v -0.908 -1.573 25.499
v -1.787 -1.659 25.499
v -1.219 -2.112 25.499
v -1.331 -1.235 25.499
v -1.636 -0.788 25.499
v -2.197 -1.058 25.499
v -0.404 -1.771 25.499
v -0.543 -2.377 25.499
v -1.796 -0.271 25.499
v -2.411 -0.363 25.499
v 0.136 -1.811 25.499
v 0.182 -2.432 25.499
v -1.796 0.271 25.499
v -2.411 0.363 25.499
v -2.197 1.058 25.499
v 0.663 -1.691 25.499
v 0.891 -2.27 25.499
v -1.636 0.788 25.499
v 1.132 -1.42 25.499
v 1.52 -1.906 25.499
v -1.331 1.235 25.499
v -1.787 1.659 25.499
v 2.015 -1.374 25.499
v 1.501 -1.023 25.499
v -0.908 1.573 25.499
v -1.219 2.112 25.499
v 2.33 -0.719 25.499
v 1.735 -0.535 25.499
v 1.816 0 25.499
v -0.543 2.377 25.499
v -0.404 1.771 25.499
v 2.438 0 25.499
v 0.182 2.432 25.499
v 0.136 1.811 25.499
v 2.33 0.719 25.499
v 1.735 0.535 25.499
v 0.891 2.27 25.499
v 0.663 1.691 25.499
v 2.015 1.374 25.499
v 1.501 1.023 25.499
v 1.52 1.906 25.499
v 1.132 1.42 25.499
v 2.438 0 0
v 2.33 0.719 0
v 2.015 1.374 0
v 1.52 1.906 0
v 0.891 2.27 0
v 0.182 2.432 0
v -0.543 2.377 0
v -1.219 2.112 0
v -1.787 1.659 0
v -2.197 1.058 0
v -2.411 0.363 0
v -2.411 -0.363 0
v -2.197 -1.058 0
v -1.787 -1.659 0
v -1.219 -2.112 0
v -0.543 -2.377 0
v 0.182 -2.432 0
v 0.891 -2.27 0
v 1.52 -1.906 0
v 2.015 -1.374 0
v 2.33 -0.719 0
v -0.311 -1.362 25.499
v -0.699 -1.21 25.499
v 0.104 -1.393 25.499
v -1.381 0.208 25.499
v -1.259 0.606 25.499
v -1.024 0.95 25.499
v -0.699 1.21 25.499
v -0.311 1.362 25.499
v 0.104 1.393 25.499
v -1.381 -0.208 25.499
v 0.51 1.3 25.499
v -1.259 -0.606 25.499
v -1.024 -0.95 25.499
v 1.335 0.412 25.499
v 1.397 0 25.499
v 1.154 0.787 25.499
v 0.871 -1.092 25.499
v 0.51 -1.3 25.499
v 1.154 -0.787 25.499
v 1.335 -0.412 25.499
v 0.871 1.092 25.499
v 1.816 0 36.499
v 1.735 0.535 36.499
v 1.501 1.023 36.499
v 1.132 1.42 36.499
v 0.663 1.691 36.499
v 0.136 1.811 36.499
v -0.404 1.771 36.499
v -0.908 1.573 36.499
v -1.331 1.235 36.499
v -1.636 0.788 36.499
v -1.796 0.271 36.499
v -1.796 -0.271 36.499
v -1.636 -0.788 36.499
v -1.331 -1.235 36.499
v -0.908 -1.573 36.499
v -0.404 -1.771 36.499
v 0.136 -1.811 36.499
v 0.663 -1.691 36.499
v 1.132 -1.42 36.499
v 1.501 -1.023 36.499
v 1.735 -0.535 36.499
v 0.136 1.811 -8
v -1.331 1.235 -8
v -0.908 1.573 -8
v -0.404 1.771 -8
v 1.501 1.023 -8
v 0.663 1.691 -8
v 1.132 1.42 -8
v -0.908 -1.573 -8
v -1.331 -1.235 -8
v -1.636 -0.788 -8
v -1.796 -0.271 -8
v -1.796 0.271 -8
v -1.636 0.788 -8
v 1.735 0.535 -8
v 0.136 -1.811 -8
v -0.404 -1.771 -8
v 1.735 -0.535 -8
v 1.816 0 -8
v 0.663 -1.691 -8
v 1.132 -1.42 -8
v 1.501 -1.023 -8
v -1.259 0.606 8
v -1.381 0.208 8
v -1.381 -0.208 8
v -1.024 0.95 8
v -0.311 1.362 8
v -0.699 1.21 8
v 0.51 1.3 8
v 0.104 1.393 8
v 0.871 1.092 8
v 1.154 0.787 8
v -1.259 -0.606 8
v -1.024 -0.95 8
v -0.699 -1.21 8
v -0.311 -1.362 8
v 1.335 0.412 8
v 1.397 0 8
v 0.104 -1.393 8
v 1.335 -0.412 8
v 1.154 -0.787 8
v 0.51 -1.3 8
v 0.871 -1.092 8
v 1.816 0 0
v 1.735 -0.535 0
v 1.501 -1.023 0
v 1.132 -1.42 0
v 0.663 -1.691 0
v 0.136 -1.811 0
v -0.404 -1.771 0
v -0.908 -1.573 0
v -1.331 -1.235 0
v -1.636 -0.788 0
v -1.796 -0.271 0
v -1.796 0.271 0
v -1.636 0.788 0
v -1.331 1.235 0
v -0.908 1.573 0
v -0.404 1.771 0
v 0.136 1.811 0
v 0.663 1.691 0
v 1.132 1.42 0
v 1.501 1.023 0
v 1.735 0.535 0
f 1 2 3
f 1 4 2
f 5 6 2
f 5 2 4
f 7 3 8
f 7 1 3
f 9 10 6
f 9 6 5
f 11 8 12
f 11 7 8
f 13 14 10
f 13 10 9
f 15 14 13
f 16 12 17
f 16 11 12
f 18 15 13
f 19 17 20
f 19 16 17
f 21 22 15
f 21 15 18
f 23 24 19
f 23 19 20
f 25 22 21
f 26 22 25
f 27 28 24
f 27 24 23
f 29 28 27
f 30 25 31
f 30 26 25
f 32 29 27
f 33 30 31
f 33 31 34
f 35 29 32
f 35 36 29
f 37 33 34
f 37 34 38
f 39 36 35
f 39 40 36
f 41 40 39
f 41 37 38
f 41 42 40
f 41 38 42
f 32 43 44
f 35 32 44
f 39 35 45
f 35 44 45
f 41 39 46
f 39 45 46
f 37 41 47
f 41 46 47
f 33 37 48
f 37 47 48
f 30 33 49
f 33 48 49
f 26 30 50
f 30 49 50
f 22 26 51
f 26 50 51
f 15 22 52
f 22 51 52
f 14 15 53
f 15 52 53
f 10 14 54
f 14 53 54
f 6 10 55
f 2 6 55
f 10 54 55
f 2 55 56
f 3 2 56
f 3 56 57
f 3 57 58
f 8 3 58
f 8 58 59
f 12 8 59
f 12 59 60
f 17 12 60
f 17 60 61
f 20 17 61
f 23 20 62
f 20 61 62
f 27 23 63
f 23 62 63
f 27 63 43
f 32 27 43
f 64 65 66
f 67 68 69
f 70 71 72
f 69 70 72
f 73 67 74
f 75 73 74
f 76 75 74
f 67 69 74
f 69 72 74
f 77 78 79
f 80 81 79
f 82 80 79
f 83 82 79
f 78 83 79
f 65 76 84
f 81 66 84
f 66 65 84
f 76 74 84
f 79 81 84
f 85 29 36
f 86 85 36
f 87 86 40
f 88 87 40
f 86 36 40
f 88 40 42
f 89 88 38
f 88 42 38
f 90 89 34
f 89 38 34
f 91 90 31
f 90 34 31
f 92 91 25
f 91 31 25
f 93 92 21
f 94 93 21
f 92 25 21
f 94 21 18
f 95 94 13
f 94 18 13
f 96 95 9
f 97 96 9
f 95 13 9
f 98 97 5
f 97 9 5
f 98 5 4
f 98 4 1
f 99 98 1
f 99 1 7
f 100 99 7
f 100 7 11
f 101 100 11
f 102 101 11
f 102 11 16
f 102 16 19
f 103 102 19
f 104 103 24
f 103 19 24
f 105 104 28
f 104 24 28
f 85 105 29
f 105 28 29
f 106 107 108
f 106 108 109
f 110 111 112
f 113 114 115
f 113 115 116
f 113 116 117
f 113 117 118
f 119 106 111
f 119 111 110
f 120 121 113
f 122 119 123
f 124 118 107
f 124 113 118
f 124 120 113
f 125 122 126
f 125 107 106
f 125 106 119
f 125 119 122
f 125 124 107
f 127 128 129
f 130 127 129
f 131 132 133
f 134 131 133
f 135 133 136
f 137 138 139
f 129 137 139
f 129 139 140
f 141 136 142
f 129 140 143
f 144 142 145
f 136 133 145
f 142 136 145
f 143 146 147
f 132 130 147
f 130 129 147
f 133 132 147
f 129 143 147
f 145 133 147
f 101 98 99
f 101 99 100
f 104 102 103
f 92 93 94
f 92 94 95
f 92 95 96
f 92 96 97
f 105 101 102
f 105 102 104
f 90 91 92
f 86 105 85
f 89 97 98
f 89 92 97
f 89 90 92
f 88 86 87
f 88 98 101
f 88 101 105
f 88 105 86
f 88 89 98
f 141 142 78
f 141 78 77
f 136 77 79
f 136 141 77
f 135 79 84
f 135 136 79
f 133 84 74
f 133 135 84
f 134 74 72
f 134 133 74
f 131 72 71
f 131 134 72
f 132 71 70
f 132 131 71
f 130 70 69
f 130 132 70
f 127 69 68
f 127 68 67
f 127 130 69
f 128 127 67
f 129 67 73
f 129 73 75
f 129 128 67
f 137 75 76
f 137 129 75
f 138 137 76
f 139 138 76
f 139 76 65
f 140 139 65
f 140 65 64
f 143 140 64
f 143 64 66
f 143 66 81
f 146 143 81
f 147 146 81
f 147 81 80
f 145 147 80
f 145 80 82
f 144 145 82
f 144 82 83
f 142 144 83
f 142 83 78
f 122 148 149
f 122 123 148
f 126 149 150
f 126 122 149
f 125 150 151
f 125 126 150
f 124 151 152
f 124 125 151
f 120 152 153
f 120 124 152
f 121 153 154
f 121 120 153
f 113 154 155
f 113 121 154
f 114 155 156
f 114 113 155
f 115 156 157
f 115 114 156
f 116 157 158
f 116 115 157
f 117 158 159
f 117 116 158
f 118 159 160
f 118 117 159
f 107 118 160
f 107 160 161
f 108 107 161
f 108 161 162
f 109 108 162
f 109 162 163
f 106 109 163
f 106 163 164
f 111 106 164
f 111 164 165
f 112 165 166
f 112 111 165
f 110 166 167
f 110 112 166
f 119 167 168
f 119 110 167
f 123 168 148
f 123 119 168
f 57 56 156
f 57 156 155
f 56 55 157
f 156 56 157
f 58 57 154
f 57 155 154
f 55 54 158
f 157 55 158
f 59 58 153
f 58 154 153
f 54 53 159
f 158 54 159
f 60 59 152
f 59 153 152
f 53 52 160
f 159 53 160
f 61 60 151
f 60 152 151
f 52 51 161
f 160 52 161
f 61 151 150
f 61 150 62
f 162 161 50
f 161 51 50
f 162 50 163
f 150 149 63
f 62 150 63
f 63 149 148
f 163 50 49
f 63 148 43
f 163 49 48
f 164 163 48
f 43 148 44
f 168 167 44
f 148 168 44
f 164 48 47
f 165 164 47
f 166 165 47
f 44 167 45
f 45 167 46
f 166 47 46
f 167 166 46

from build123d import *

# Parameters (mm, degrees)
SKETCH1_R               = 2.4384
SKETCH1_R_2             = 1.397
BOSS_EXTRUDE1_DEPTH     = 25.49906
CROQUIS1_R              = 1.8161
SALIENTE_EXTRUIR1_DEPTH = 11
CROQUIS2_R              = 1.8161
SALIENTE_EXTRUIR2_DEPTH = 8


with BuildPart() as part:
    # Sketch1 → Boss-Extrude1 (new body)
    with BuildSketch(Plane.XY):
        Circle(SKETCH1_R)
        Circle(SKETCH1_R_2, mode=Mode.SUBTRACT)
    extrude(amount=BOSS_EXTRUDE1_DEPTH)

    # Croquis1 → Saliente-Extruir1 (add)
    with BuildSketch(Plane.XY.offset(25.49906)):
        Circle(CROQUIS1_R)
    extrude(amount=SALIENTE_EXTRUIR1_DEPTH)

    # Croquis2 → Saliente-Extruir2 (add, symmetric)
    with BuildSketch(Plane(origin=(0, 0, 0), x_dir=(-1, 0, 0), z_dir=(0, 0, -1))):
        with Locations(Location((0, 0, 0), (0, 0, 180))):
            Circle(CROQUIS2_R)
    extrude(amount=SALIENTE_EXTRUIR2_DEPTH, both=True)


solid = part.part
